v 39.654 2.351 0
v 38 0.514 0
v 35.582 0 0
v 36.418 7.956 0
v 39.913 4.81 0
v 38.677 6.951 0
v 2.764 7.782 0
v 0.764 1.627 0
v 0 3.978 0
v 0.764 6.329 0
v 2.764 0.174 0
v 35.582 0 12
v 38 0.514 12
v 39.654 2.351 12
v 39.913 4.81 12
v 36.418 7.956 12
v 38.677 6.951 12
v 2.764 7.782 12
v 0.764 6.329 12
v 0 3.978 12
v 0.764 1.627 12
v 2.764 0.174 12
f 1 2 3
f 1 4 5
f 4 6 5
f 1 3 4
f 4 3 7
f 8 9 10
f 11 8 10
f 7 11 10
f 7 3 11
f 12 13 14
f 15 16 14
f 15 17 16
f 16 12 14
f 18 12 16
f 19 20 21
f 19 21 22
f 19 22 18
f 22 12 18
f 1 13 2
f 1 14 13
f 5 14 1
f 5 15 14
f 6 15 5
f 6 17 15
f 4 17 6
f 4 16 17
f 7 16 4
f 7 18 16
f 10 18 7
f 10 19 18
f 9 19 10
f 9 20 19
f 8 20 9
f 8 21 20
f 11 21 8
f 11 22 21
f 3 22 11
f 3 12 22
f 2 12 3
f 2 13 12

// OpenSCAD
$fn = 32;

// ----------------------------------------------------------------------
// Key bar: parallel key, 12 mm thick
// ----------------------------------------------------------------------

// --- parameters (mm) ---
profile_height = 12;      // extrusion height
profile_points = 11;      // points of the closed outline

profile = [[0, 3.978], [0.764, 1.627], [2.764, 0.174], [35.582, 0], [38, 0.514], [39.654, 2.351], [39.913, 4.81], [38.677, 6.951], [36.418, 7.956], [2.764, 7.782], [0.764, 6.329]];  // single closed polygon, 11 points, counter clockwise

// --- the one profile operation ---
linear_extrude(height = profile_height) polygon(points = profile);
